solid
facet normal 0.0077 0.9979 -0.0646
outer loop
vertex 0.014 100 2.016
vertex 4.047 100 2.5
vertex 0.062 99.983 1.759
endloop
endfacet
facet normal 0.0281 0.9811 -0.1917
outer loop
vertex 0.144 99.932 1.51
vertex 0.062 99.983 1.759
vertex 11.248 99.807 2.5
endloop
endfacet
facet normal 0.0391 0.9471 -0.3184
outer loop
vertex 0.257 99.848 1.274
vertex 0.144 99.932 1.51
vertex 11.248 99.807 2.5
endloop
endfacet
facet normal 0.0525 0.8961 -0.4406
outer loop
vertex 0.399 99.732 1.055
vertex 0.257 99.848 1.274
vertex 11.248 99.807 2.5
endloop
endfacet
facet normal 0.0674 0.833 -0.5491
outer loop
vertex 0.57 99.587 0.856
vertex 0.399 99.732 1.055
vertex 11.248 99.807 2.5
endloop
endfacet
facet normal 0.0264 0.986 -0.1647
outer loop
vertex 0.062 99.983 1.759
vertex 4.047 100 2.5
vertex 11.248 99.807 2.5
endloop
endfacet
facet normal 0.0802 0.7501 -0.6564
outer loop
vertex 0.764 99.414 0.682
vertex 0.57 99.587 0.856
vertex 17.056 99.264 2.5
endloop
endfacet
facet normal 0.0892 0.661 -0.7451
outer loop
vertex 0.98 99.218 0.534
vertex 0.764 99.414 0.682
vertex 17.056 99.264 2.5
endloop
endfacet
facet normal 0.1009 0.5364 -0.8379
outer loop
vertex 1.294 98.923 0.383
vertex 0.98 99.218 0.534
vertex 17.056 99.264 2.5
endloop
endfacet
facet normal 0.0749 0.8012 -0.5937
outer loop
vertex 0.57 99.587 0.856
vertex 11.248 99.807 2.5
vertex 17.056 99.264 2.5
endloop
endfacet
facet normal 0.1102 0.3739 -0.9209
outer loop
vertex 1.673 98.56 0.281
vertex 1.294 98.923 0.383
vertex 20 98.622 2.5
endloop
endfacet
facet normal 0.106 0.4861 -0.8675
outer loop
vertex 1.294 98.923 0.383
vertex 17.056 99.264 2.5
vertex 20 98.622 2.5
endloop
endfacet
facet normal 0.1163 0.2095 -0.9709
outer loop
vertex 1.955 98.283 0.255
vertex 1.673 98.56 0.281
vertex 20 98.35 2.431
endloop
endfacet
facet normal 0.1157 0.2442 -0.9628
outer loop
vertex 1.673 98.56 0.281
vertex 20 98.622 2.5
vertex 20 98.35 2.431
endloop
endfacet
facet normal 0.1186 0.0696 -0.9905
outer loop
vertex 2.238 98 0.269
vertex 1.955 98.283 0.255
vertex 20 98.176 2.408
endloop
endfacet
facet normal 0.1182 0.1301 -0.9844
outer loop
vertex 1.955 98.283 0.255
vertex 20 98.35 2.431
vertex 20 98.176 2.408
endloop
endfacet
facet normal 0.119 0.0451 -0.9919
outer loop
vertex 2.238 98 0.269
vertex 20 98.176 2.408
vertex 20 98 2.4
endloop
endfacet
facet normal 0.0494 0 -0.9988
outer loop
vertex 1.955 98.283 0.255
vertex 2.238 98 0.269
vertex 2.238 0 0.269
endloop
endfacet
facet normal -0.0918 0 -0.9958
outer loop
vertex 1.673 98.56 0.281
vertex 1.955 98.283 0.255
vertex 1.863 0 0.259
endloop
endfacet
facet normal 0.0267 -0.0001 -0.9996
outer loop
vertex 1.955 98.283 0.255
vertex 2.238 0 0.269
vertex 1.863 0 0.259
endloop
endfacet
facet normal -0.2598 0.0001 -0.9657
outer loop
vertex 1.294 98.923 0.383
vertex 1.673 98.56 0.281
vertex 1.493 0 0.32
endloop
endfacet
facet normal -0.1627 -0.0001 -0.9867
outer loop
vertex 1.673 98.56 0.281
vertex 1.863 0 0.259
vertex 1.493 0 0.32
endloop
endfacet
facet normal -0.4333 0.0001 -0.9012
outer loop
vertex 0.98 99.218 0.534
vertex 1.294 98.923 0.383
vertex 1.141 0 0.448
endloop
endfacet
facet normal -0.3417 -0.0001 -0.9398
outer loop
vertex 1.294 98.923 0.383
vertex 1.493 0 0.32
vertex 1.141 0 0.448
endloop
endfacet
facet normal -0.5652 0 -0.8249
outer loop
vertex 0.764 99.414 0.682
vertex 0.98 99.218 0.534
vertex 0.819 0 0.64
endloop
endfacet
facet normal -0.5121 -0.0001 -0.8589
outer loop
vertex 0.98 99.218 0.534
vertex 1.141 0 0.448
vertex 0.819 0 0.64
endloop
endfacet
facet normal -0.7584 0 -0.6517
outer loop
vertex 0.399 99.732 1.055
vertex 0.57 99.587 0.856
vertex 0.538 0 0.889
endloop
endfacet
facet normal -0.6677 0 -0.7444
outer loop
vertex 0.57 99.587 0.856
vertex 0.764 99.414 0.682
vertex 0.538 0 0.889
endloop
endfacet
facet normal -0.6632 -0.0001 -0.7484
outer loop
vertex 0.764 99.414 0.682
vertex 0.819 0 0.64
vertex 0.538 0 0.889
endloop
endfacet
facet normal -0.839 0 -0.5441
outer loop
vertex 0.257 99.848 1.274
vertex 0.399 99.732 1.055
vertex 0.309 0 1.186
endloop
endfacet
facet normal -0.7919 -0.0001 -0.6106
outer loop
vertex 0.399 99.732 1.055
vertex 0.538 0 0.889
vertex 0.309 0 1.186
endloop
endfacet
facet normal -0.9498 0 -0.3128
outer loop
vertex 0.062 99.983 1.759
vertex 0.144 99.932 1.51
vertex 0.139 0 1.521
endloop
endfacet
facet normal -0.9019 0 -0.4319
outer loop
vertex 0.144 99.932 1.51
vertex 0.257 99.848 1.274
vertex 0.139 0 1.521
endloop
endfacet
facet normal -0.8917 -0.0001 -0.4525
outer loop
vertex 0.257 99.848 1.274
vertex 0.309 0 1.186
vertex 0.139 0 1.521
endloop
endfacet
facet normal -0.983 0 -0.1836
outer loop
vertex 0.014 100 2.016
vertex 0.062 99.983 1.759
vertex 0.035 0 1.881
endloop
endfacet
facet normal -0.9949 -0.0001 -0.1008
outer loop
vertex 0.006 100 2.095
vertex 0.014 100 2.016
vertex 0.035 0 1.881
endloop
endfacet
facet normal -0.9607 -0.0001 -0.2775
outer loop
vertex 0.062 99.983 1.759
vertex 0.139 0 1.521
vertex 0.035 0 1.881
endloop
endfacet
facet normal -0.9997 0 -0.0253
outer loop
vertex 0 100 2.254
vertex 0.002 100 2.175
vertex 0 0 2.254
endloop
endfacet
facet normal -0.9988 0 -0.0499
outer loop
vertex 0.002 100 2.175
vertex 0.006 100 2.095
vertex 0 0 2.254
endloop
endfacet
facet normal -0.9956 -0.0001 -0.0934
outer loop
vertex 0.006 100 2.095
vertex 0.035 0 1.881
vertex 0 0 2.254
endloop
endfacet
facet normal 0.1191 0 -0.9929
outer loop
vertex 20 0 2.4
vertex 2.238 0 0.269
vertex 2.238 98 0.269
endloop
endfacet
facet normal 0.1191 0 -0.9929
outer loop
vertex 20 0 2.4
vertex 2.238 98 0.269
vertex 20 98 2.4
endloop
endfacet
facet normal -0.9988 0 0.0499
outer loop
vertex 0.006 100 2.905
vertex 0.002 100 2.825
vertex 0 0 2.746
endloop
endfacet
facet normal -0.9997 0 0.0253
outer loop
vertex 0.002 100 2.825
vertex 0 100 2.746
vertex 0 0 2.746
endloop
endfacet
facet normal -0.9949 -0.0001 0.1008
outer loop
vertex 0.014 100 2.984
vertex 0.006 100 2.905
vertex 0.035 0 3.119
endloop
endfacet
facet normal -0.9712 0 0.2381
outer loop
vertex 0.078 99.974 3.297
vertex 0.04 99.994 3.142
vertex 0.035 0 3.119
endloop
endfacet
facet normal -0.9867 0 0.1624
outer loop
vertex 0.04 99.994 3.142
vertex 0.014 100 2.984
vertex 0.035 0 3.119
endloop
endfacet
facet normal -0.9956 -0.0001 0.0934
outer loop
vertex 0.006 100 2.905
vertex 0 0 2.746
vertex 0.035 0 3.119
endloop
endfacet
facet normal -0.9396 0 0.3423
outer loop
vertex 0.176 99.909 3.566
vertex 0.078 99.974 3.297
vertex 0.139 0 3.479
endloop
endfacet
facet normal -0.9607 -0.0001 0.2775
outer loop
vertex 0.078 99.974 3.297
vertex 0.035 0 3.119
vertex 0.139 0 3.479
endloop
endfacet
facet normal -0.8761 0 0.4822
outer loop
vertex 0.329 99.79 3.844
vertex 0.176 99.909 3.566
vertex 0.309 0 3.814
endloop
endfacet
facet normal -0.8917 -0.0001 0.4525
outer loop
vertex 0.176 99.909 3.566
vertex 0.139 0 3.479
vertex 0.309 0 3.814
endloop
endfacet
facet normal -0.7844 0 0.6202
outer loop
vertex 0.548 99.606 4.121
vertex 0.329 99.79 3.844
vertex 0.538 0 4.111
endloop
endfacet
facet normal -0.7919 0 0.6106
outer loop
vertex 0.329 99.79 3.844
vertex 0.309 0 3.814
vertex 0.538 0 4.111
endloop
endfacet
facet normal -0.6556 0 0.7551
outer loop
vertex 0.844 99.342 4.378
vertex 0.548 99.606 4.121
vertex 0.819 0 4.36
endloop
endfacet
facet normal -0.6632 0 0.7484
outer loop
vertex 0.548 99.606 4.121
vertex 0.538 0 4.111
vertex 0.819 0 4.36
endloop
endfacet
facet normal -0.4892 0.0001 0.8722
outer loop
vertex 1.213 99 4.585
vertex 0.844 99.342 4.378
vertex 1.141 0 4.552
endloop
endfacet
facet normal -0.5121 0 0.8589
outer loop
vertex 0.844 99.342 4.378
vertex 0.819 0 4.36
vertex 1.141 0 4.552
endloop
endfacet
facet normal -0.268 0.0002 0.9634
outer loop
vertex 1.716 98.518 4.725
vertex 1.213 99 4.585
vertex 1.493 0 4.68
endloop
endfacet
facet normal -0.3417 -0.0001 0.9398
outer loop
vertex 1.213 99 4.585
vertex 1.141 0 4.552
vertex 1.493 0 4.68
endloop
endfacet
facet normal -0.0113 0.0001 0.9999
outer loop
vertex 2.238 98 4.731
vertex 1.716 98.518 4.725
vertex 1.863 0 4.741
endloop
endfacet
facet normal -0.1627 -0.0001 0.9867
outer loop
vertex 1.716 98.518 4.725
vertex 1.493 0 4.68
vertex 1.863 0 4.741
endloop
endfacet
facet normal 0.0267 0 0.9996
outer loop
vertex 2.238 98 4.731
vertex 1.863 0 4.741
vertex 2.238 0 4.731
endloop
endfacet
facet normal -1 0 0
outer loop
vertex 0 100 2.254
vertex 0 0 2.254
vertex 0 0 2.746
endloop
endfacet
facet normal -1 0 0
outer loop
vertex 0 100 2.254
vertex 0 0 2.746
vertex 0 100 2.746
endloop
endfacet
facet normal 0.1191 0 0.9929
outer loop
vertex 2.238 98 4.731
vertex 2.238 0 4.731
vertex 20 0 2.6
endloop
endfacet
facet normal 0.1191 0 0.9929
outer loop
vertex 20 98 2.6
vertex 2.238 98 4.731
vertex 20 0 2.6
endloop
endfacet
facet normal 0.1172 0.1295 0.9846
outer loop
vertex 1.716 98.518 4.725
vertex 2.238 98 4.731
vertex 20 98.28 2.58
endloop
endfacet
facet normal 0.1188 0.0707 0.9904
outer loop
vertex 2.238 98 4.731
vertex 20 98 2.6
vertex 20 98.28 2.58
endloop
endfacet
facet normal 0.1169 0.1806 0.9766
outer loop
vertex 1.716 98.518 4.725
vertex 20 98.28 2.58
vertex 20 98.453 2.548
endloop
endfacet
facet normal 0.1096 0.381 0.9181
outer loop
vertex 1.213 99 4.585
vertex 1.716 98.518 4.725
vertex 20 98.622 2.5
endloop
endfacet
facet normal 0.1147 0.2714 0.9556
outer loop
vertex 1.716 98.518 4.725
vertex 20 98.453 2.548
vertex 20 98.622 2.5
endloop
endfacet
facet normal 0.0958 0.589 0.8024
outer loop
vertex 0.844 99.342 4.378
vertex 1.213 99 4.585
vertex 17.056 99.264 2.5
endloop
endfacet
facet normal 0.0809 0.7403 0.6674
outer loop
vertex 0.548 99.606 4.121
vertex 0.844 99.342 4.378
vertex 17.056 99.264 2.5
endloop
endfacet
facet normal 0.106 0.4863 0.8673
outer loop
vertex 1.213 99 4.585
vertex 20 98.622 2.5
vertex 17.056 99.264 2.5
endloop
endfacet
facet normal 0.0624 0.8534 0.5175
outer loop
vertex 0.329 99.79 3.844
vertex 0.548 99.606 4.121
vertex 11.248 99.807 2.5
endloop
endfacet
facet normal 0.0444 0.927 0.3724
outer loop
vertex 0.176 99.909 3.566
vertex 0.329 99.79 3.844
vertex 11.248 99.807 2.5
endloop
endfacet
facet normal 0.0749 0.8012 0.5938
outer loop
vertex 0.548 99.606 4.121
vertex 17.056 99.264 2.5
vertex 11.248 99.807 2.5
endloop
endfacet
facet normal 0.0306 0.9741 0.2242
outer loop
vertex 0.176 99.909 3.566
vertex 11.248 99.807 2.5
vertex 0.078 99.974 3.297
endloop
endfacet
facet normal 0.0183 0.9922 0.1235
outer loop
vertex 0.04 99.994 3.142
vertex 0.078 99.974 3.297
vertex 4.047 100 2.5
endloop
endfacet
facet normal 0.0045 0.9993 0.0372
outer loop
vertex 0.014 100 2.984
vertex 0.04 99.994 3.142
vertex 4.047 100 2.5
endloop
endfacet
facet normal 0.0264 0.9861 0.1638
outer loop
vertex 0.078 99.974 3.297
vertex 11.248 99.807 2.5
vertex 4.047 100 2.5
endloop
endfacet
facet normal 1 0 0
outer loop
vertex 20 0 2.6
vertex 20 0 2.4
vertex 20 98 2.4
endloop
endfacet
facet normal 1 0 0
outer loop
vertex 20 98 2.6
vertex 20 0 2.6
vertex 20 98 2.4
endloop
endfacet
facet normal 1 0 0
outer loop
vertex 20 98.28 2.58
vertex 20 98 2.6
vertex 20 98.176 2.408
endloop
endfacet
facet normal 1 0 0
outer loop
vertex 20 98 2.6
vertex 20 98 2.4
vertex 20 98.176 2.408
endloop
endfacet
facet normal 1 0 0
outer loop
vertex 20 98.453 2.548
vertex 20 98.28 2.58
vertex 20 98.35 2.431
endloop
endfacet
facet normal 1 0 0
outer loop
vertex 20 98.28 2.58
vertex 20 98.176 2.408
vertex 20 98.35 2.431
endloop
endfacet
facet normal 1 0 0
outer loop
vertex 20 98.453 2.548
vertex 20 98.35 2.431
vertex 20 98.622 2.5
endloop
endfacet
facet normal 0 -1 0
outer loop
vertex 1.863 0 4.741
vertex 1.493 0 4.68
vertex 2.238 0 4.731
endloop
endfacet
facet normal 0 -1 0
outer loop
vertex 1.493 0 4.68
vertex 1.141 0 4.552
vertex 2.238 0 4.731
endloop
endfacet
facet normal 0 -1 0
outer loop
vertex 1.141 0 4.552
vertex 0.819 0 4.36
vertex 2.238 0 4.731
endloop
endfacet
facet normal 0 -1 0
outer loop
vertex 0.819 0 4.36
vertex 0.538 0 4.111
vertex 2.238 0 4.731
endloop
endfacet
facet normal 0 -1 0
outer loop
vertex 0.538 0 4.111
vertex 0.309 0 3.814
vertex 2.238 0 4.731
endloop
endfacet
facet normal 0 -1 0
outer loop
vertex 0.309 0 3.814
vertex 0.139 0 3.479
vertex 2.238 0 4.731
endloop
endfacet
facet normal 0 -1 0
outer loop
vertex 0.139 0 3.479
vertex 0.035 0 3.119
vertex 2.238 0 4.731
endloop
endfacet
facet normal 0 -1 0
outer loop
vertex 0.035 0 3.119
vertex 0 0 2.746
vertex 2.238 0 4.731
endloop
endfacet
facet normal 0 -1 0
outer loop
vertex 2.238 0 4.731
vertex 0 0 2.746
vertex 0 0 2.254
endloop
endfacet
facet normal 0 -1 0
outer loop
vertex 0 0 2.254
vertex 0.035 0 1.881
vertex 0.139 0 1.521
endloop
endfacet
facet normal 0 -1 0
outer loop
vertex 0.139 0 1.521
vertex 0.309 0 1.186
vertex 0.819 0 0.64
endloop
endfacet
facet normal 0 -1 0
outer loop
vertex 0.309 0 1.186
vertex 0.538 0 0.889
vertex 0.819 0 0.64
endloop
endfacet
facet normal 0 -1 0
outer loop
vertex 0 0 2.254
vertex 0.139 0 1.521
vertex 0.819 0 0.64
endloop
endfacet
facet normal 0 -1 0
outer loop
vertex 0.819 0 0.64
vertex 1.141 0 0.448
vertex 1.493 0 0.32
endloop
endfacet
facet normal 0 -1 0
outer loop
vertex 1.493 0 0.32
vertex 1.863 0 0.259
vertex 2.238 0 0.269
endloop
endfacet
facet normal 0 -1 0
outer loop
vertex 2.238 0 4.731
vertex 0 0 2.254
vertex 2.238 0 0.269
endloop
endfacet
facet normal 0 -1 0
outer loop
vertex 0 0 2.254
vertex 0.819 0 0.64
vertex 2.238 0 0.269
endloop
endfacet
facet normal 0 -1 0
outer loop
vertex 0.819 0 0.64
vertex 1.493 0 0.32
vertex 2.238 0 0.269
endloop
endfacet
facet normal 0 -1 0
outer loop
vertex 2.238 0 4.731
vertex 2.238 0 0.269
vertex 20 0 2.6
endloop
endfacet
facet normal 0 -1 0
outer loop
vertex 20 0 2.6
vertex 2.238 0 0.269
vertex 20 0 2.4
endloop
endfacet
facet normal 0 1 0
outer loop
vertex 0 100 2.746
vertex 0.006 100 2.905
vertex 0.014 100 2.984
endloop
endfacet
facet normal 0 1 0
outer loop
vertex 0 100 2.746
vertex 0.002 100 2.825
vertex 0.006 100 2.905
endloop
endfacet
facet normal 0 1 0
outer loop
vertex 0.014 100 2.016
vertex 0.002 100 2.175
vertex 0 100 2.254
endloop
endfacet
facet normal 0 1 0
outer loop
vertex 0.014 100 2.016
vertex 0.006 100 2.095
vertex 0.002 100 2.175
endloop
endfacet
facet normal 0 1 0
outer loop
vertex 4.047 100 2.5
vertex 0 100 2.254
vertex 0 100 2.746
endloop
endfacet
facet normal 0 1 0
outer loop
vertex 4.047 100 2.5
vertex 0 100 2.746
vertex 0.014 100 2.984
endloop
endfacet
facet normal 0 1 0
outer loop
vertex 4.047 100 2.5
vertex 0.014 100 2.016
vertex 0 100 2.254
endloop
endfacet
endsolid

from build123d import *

# Parameters (mm, degrees)
SKETCH1_W               = 20
SKETCH1_H               = 100
BOSS_EXTRUDE1_DEPTH     = 5
CUT_EXTRUDE1_DEPTH      = 103.102889283
CUT_EXTRUDE1_DEPTH_BACK = 103.102889283
FILLET1_R               = 2


with BuildPart() as part:
    # Sketch1 → Boss-Extrude1 (new body)
    with BuildSketch(Plane.XY):
        with Locations((10, 50)):
            Rectangle(SKETCH1_W, SKETCH1_H)
    extrude(amount=BOSS_EXTRUDE1_DEPTH)

    # Sketch2 → Cut-Extrude1 (cut, two sides: drawn at the far end of the back side and taken through both)
    with BuildSketch(Plane(origin=(0, 0, 0), x_dir=(1, 0, 0), z_dir=(0, 1, 0)).offset(-CUT_EXTRUDE1_DEPTH_BACK)):
        Polygon((0, 0), (20, -2.4), (20, 0), align=None)
        Polygon((0, -5), (20, -2.6), (20, -5), align=None)
    extrude(amount=CUT_EXTRUDE1_DEPTH + CUT_EXTRUDE1_DEPTH_BACK, mode=Mode.SUBTRACT)

    # Fillet1
    # the kernel refuses this fillet: 2 mm, written as the material it takes off along each edge
    with BuildSketch(Plane(origin=(0, -5.635871325, 0), x_dir=(0, 0, 1), z_dir=(0, 1, 0))) as fillet1_piece_1:
        with BuildLine():
            CenterArc((FILLET1_R * 1.12717426496, FILLET1_R), FILLET1_R, 173.157226587, 96.842773413)
            Line((FILLET1_R * 0.134297426474, FILLET1_R * 1.11914522062), (0, 0))
            Line((0, 0), (FILLET1_R * 1.12717426496, 0))
        make_face()
    extrude(amount=111.27174265, mode=Mode.SUBTRACT)
    with BuildSketch(Plane(origin=(0, -5.635871325, 5), x_dir=(0, 0, -1), z_dir=(0, 1, 0))) as fillet1_piece_2:
        with BuildLine():
            CenterArc((FILLET1_R * 1.12717426496, -FILLET1_R), FILLET1_R, 90, 96.842773413)
            Line((FILLET1_R * 0.134297426474, -FILLET1_R * 1.11914522062), (0, 0))
            Line((0, 0), (FILLET1_R * 1.12717426496, 0))
        make_face()
    extrude(amount=111.27174265, mode=Mode.SUBTRACT)
    with BuildSketch(Plane(origin=(24.964384192, 100, 2.995726103), x_dir=(-0.11914522061843055, 0, 0.9928768384869221), z_dir=(-0.9928768384869221, 0, -0.11914522061843054))) as fillet1_piece_3:
        with BuildLine():
            CenterArc((FILLET1_R, -FILLET1_R), FILLET1_R, 90, 90)
            Line((0, -FILLET1_R), (0, 0))
            Line((0, 0), (FILLET1_R, 0))
        make_face()
    extrude(amount=30.143485299, mode=Mode.SUBTRACT)
    with BuildSketch(Plane(origin=(24.964384192, 100, 2.004273897), x_dir=(-0.11914522061843079, 0, -0.9928768384869221), z_dir=(-0.9928768384869221, 0, 0.11914522061843079))) as fillet1_piece_4:
        with BuildLine():
            CenterArc((FILLET1_R, FILLET1_R), FILLET1_R, 180, 90)
            Line((0, FILLET1_R), (0, 0))
            Line((0, 0), (FILLET1_R, 0))
        make_face()
    extrude(amount=30.143485299, mode=Mode.SUBTRACT)


solid = part.part
